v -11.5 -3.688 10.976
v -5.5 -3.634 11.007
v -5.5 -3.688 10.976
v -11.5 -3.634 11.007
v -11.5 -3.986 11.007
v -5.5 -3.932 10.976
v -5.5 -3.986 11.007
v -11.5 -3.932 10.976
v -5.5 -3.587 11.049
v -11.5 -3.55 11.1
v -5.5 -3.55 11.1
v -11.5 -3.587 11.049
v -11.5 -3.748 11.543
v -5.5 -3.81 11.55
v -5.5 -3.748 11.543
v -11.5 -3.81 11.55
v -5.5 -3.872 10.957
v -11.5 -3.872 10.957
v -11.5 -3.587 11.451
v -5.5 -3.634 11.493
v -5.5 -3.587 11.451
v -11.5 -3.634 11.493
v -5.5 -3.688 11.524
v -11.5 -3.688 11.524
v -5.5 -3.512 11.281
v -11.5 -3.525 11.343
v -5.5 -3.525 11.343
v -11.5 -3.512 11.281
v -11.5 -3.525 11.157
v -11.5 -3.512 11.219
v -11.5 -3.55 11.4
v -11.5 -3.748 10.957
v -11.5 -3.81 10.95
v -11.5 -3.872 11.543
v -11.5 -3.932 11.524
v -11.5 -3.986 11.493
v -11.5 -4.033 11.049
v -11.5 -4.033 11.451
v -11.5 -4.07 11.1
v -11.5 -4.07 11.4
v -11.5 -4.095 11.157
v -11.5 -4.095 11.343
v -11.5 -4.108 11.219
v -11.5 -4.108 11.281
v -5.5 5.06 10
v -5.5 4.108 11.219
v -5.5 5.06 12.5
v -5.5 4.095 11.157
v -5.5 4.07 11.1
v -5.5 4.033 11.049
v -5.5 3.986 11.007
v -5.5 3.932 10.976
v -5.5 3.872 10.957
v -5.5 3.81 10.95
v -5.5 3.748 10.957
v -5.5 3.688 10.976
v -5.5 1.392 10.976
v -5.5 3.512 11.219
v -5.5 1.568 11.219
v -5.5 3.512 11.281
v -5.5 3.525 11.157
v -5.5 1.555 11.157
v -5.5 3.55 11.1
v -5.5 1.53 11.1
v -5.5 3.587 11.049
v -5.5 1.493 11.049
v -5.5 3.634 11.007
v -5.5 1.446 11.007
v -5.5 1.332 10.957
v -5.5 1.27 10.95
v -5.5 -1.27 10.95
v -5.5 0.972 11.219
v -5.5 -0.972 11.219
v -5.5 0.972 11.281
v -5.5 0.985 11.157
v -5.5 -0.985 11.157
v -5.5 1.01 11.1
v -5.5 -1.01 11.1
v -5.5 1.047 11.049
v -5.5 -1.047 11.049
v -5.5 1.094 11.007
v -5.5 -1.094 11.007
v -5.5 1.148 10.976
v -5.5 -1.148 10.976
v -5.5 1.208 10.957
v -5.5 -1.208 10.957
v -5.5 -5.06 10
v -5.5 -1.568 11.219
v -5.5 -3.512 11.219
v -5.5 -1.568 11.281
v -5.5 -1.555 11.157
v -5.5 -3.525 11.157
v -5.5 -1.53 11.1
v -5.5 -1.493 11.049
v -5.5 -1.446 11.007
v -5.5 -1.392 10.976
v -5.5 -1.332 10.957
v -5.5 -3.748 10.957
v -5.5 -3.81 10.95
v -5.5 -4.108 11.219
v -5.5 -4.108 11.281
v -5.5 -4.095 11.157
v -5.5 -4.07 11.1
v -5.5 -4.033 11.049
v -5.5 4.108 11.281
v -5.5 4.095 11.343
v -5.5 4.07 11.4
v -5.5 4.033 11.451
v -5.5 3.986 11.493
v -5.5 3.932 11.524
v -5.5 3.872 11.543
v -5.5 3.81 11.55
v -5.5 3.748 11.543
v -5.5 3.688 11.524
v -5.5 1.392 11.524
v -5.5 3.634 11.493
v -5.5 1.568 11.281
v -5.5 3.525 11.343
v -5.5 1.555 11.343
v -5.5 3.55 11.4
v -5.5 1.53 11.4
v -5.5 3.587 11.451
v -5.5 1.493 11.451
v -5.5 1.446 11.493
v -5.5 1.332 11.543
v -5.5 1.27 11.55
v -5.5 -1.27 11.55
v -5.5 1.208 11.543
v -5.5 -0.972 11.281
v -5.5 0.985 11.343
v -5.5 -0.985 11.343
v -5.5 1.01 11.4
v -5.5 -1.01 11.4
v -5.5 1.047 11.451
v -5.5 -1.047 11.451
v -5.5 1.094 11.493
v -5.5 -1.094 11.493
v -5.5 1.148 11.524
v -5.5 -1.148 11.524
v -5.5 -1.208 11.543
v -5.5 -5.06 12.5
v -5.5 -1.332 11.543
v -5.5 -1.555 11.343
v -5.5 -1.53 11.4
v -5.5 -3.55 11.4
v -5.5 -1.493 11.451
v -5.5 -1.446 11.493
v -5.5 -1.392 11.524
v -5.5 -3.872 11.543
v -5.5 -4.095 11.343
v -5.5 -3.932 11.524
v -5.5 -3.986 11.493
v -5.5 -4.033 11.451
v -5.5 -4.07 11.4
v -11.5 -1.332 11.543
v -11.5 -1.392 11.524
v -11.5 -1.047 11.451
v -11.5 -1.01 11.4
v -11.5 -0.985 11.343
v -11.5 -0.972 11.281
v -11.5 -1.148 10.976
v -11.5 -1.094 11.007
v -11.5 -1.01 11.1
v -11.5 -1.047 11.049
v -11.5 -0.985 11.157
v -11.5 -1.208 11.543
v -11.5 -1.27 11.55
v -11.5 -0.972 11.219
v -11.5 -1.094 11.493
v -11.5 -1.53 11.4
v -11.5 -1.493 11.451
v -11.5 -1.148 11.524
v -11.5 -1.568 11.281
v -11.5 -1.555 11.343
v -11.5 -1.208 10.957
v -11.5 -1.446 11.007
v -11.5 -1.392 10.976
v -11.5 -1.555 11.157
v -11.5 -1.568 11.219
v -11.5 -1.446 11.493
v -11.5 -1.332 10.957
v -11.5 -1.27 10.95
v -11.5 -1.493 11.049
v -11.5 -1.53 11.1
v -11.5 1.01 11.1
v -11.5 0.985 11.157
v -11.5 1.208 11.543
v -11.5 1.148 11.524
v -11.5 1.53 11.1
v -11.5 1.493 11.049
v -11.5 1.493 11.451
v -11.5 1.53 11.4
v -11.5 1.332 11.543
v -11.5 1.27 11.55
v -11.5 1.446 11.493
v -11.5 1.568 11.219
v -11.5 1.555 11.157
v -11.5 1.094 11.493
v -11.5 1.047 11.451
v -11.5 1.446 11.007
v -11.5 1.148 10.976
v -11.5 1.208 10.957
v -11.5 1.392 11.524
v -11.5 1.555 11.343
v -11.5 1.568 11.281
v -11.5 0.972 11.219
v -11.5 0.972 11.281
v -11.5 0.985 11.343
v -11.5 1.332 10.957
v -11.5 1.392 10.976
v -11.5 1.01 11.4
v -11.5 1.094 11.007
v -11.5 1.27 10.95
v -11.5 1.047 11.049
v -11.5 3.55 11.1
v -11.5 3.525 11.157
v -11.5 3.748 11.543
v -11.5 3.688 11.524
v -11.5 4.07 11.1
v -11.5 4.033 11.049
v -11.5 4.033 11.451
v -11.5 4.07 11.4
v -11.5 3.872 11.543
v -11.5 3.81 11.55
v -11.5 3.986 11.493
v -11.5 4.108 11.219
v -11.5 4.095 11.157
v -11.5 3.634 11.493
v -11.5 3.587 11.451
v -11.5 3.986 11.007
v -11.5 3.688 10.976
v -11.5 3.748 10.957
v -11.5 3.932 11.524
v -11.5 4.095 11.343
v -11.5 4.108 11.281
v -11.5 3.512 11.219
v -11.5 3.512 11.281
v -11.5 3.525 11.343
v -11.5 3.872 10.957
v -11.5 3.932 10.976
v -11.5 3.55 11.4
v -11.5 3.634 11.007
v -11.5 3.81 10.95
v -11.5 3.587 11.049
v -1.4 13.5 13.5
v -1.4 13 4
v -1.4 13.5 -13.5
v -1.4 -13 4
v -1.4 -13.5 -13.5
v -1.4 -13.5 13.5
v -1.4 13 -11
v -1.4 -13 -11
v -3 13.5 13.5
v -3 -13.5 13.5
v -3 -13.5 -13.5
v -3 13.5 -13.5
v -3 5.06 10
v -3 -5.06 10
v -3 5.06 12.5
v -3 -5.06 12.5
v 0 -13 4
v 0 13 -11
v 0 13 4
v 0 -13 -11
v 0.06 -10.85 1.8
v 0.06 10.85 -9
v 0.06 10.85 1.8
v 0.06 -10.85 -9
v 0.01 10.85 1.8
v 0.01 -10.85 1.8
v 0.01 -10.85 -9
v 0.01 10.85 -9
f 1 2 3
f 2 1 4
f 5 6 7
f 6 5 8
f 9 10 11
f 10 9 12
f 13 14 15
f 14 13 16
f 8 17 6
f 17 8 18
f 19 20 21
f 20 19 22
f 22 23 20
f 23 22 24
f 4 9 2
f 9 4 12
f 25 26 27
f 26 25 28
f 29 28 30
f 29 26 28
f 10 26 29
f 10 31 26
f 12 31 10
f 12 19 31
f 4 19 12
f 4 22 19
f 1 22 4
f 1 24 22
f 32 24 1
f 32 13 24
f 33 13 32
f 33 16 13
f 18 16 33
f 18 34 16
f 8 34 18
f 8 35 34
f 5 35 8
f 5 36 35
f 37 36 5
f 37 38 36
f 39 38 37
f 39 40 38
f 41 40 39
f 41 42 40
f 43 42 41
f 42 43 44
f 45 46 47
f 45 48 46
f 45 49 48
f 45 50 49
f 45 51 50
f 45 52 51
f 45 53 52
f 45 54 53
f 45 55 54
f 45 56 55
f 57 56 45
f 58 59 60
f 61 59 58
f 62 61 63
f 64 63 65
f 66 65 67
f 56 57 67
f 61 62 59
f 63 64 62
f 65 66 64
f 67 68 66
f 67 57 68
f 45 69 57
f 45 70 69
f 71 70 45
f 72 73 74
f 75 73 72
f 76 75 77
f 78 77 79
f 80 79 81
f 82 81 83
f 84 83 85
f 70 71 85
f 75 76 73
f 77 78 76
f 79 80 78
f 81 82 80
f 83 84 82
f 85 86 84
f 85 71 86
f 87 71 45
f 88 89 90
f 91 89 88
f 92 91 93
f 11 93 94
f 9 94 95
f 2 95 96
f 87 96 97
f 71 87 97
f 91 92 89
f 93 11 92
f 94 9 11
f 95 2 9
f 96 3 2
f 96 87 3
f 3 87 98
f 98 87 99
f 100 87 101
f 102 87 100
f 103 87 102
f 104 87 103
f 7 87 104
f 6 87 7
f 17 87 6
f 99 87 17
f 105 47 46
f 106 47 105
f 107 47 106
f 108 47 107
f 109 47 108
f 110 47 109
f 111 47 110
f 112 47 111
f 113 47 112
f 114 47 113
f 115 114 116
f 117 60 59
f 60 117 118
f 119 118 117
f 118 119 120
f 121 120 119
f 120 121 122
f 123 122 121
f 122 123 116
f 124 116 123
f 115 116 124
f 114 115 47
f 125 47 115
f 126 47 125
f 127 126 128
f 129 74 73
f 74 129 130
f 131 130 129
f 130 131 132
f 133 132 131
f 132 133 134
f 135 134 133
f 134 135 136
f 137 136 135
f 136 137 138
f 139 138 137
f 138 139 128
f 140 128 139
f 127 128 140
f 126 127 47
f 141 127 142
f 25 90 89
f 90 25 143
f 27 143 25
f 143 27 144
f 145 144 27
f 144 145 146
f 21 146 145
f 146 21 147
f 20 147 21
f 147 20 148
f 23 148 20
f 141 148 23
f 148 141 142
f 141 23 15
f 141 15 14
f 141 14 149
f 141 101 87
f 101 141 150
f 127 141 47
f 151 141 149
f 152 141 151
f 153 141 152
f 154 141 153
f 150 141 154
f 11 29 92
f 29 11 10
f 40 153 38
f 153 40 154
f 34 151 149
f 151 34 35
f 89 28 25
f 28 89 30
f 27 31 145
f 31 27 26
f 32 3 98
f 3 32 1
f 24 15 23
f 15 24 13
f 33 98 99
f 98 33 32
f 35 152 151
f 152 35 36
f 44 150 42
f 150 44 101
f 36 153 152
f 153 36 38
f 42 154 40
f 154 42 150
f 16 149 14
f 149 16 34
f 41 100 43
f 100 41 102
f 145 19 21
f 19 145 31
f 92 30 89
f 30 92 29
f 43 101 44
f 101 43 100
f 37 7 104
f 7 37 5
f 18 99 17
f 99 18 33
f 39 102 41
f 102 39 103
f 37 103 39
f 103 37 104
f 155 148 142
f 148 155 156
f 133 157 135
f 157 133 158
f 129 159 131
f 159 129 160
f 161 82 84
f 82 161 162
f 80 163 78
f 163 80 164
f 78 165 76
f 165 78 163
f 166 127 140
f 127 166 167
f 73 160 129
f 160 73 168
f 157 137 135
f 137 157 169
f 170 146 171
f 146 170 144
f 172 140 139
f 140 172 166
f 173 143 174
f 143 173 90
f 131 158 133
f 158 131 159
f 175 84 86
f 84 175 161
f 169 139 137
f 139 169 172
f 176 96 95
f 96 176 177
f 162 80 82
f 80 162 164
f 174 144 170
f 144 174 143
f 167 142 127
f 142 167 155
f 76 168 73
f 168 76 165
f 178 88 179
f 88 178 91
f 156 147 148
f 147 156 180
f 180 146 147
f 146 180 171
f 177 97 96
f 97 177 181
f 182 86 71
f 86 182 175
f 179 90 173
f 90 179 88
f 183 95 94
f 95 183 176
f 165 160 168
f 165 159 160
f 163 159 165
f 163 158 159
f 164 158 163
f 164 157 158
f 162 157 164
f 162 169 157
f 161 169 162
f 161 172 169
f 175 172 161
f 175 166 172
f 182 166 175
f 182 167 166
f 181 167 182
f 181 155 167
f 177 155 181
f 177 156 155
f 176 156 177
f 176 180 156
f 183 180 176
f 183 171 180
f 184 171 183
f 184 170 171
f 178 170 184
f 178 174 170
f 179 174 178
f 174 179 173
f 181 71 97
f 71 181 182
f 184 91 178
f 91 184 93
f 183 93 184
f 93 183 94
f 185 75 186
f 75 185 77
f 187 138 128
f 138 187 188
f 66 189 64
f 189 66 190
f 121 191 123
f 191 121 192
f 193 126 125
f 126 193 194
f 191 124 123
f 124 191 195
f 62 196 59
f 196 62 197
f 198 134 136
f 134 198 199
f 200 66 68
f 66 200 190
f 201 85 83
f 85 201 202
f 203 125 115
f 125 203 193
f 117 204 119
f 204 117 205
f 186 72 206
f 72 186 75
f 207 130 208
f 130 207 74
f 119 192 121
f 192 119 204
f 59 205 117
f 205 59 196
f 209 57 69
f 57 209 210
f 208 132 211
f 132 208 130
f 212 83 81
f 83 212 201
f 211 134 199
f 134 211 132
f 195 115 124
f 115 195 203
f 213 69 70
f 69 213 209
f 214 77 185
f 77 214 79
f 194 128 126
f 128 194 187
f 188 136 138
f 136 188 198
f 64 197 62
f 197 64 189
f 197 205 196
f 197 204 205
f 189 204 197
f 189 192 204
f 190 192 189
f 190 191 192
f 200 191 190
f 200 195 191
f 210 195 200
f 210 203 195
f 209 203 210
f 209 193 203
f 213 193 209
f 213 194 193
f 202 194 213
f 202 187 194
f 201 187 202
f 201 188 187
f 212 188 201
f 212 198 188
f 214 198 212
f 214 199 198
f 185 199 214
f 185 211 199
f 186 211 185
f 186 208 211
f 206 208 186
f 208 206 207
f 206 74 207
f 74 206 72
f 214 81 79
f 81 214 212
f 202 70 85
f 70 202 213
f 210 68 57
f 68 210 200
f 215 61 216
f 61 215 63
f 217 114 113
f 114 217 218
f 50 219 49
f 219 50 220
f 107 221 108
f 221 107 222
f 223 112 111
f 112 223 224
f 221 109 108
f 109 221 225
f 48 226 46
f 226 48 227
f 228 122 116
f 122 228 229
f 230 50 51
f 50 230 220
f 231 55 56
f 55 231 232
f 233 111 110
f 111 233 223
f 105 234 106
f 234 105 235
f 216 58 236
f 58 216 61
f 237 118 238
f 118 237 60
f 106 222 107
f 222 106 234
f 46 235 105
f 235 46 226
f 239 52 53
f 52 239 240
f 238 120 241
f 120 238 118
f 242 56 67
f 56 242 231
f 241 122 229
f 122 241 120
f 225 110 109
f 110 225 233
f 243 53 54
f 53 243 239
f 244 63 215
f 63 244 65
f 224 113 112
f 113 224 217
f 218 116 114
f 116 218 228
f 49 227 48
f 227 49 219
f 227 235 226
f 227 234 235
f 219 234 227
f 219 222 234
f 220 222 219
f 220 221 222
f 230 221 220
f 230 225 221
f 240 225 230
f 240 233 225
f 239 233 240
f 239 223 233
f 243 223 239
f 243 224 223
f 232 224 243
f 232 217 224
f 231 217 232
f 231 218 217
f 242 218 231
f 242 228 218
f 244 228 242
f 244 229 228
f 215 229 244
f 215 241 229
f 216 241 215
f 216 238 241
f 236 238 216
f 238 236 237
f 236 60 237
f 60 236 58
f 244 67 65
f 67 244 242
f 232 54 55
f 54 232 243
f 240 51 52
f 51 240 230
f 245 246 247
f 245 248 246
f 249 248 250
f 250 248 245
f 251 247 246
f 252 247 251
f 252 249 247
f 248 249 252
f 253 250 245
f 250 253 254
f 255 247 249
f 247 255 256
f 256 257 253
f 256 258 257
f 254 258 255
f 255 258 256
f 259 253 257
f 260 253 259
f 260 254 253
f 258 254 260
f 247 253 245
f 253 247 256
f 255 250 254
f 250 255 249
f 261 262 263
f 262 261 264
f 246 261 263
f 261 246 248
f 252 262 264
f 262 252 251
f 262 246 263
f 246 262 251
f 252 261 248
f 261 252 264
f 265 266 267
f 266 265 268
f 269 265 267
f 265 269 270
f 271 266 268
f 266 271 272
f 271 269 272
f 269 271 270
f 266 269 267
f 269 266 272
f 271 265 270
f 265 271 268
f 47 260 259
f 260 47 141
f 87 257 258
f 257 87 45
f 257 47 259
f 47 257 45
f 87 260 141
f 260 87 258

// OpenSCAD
// ===================================================================
// 0.96" SSD1306 I2C 128x64 OLED 屏幕显示模块
// 工业标准 1:1 CAD 实体模型
// ===================================================================

$fn = 30;

module oled_096() {
    // 1. 蓝色 PCB 基板 (厚度沿 X: -3.0 到 -1.4, 宽 Y: 27.0, 高 Z: 27.0 mm)
    color([0.1, 0.35, 0.75]) {
        translate([-3.0, -27.0/2, -27.0/2])
            cube([1.6, 27.0, 27.0]);
    }

    // 2. 超薄玻璃显示面板 (厚度沿 X: -1.4 到 0.0, 宽 Y: 26.0, 高 Z: 15.0 mm)
    color([0.05, 0.08, 0.12]) {
        translate([-1.4, -26.0/2, -27.0/2 + 2.5])
            cube([1.4, 26.0, 15.0]);
    }

    // 3. 有效发光显示区 (X=0.01 贴面发光, 宽 Y: 21.7, 高 Z: 10.8 mm)
    color([0.2, 0.75, 0.95]) {
        translate([0.01, -21.7/2, -27.0/2 + 4.5])
            cube([0.05, 21.7, 10.8]);
    }

    // 4. 顶部 4-Pin 2.54mm I2C 排针 (VCC, GND, SCL, SDA, 朝向内部 -X 走线)
    color([0.2, 0.2, 0.2]) {
        translate([-5.5, -2.54*1.5 - 1.25, 27.0/2 - 3.5])
            cube([2.5, 2.54*3 + 2.5, 2.5]);
    }
    color([0.85, 0.75, 0.3]) {
        for (i = [0 : 3]) {
            translate([-5.5, -2.54*1.5 + i*2.54, 27.0/2 - 2.25])
                rotate([0, -90, 0])
                cylinder(d=0.6, h=6.0);
        }
    }
}

oled_096();
